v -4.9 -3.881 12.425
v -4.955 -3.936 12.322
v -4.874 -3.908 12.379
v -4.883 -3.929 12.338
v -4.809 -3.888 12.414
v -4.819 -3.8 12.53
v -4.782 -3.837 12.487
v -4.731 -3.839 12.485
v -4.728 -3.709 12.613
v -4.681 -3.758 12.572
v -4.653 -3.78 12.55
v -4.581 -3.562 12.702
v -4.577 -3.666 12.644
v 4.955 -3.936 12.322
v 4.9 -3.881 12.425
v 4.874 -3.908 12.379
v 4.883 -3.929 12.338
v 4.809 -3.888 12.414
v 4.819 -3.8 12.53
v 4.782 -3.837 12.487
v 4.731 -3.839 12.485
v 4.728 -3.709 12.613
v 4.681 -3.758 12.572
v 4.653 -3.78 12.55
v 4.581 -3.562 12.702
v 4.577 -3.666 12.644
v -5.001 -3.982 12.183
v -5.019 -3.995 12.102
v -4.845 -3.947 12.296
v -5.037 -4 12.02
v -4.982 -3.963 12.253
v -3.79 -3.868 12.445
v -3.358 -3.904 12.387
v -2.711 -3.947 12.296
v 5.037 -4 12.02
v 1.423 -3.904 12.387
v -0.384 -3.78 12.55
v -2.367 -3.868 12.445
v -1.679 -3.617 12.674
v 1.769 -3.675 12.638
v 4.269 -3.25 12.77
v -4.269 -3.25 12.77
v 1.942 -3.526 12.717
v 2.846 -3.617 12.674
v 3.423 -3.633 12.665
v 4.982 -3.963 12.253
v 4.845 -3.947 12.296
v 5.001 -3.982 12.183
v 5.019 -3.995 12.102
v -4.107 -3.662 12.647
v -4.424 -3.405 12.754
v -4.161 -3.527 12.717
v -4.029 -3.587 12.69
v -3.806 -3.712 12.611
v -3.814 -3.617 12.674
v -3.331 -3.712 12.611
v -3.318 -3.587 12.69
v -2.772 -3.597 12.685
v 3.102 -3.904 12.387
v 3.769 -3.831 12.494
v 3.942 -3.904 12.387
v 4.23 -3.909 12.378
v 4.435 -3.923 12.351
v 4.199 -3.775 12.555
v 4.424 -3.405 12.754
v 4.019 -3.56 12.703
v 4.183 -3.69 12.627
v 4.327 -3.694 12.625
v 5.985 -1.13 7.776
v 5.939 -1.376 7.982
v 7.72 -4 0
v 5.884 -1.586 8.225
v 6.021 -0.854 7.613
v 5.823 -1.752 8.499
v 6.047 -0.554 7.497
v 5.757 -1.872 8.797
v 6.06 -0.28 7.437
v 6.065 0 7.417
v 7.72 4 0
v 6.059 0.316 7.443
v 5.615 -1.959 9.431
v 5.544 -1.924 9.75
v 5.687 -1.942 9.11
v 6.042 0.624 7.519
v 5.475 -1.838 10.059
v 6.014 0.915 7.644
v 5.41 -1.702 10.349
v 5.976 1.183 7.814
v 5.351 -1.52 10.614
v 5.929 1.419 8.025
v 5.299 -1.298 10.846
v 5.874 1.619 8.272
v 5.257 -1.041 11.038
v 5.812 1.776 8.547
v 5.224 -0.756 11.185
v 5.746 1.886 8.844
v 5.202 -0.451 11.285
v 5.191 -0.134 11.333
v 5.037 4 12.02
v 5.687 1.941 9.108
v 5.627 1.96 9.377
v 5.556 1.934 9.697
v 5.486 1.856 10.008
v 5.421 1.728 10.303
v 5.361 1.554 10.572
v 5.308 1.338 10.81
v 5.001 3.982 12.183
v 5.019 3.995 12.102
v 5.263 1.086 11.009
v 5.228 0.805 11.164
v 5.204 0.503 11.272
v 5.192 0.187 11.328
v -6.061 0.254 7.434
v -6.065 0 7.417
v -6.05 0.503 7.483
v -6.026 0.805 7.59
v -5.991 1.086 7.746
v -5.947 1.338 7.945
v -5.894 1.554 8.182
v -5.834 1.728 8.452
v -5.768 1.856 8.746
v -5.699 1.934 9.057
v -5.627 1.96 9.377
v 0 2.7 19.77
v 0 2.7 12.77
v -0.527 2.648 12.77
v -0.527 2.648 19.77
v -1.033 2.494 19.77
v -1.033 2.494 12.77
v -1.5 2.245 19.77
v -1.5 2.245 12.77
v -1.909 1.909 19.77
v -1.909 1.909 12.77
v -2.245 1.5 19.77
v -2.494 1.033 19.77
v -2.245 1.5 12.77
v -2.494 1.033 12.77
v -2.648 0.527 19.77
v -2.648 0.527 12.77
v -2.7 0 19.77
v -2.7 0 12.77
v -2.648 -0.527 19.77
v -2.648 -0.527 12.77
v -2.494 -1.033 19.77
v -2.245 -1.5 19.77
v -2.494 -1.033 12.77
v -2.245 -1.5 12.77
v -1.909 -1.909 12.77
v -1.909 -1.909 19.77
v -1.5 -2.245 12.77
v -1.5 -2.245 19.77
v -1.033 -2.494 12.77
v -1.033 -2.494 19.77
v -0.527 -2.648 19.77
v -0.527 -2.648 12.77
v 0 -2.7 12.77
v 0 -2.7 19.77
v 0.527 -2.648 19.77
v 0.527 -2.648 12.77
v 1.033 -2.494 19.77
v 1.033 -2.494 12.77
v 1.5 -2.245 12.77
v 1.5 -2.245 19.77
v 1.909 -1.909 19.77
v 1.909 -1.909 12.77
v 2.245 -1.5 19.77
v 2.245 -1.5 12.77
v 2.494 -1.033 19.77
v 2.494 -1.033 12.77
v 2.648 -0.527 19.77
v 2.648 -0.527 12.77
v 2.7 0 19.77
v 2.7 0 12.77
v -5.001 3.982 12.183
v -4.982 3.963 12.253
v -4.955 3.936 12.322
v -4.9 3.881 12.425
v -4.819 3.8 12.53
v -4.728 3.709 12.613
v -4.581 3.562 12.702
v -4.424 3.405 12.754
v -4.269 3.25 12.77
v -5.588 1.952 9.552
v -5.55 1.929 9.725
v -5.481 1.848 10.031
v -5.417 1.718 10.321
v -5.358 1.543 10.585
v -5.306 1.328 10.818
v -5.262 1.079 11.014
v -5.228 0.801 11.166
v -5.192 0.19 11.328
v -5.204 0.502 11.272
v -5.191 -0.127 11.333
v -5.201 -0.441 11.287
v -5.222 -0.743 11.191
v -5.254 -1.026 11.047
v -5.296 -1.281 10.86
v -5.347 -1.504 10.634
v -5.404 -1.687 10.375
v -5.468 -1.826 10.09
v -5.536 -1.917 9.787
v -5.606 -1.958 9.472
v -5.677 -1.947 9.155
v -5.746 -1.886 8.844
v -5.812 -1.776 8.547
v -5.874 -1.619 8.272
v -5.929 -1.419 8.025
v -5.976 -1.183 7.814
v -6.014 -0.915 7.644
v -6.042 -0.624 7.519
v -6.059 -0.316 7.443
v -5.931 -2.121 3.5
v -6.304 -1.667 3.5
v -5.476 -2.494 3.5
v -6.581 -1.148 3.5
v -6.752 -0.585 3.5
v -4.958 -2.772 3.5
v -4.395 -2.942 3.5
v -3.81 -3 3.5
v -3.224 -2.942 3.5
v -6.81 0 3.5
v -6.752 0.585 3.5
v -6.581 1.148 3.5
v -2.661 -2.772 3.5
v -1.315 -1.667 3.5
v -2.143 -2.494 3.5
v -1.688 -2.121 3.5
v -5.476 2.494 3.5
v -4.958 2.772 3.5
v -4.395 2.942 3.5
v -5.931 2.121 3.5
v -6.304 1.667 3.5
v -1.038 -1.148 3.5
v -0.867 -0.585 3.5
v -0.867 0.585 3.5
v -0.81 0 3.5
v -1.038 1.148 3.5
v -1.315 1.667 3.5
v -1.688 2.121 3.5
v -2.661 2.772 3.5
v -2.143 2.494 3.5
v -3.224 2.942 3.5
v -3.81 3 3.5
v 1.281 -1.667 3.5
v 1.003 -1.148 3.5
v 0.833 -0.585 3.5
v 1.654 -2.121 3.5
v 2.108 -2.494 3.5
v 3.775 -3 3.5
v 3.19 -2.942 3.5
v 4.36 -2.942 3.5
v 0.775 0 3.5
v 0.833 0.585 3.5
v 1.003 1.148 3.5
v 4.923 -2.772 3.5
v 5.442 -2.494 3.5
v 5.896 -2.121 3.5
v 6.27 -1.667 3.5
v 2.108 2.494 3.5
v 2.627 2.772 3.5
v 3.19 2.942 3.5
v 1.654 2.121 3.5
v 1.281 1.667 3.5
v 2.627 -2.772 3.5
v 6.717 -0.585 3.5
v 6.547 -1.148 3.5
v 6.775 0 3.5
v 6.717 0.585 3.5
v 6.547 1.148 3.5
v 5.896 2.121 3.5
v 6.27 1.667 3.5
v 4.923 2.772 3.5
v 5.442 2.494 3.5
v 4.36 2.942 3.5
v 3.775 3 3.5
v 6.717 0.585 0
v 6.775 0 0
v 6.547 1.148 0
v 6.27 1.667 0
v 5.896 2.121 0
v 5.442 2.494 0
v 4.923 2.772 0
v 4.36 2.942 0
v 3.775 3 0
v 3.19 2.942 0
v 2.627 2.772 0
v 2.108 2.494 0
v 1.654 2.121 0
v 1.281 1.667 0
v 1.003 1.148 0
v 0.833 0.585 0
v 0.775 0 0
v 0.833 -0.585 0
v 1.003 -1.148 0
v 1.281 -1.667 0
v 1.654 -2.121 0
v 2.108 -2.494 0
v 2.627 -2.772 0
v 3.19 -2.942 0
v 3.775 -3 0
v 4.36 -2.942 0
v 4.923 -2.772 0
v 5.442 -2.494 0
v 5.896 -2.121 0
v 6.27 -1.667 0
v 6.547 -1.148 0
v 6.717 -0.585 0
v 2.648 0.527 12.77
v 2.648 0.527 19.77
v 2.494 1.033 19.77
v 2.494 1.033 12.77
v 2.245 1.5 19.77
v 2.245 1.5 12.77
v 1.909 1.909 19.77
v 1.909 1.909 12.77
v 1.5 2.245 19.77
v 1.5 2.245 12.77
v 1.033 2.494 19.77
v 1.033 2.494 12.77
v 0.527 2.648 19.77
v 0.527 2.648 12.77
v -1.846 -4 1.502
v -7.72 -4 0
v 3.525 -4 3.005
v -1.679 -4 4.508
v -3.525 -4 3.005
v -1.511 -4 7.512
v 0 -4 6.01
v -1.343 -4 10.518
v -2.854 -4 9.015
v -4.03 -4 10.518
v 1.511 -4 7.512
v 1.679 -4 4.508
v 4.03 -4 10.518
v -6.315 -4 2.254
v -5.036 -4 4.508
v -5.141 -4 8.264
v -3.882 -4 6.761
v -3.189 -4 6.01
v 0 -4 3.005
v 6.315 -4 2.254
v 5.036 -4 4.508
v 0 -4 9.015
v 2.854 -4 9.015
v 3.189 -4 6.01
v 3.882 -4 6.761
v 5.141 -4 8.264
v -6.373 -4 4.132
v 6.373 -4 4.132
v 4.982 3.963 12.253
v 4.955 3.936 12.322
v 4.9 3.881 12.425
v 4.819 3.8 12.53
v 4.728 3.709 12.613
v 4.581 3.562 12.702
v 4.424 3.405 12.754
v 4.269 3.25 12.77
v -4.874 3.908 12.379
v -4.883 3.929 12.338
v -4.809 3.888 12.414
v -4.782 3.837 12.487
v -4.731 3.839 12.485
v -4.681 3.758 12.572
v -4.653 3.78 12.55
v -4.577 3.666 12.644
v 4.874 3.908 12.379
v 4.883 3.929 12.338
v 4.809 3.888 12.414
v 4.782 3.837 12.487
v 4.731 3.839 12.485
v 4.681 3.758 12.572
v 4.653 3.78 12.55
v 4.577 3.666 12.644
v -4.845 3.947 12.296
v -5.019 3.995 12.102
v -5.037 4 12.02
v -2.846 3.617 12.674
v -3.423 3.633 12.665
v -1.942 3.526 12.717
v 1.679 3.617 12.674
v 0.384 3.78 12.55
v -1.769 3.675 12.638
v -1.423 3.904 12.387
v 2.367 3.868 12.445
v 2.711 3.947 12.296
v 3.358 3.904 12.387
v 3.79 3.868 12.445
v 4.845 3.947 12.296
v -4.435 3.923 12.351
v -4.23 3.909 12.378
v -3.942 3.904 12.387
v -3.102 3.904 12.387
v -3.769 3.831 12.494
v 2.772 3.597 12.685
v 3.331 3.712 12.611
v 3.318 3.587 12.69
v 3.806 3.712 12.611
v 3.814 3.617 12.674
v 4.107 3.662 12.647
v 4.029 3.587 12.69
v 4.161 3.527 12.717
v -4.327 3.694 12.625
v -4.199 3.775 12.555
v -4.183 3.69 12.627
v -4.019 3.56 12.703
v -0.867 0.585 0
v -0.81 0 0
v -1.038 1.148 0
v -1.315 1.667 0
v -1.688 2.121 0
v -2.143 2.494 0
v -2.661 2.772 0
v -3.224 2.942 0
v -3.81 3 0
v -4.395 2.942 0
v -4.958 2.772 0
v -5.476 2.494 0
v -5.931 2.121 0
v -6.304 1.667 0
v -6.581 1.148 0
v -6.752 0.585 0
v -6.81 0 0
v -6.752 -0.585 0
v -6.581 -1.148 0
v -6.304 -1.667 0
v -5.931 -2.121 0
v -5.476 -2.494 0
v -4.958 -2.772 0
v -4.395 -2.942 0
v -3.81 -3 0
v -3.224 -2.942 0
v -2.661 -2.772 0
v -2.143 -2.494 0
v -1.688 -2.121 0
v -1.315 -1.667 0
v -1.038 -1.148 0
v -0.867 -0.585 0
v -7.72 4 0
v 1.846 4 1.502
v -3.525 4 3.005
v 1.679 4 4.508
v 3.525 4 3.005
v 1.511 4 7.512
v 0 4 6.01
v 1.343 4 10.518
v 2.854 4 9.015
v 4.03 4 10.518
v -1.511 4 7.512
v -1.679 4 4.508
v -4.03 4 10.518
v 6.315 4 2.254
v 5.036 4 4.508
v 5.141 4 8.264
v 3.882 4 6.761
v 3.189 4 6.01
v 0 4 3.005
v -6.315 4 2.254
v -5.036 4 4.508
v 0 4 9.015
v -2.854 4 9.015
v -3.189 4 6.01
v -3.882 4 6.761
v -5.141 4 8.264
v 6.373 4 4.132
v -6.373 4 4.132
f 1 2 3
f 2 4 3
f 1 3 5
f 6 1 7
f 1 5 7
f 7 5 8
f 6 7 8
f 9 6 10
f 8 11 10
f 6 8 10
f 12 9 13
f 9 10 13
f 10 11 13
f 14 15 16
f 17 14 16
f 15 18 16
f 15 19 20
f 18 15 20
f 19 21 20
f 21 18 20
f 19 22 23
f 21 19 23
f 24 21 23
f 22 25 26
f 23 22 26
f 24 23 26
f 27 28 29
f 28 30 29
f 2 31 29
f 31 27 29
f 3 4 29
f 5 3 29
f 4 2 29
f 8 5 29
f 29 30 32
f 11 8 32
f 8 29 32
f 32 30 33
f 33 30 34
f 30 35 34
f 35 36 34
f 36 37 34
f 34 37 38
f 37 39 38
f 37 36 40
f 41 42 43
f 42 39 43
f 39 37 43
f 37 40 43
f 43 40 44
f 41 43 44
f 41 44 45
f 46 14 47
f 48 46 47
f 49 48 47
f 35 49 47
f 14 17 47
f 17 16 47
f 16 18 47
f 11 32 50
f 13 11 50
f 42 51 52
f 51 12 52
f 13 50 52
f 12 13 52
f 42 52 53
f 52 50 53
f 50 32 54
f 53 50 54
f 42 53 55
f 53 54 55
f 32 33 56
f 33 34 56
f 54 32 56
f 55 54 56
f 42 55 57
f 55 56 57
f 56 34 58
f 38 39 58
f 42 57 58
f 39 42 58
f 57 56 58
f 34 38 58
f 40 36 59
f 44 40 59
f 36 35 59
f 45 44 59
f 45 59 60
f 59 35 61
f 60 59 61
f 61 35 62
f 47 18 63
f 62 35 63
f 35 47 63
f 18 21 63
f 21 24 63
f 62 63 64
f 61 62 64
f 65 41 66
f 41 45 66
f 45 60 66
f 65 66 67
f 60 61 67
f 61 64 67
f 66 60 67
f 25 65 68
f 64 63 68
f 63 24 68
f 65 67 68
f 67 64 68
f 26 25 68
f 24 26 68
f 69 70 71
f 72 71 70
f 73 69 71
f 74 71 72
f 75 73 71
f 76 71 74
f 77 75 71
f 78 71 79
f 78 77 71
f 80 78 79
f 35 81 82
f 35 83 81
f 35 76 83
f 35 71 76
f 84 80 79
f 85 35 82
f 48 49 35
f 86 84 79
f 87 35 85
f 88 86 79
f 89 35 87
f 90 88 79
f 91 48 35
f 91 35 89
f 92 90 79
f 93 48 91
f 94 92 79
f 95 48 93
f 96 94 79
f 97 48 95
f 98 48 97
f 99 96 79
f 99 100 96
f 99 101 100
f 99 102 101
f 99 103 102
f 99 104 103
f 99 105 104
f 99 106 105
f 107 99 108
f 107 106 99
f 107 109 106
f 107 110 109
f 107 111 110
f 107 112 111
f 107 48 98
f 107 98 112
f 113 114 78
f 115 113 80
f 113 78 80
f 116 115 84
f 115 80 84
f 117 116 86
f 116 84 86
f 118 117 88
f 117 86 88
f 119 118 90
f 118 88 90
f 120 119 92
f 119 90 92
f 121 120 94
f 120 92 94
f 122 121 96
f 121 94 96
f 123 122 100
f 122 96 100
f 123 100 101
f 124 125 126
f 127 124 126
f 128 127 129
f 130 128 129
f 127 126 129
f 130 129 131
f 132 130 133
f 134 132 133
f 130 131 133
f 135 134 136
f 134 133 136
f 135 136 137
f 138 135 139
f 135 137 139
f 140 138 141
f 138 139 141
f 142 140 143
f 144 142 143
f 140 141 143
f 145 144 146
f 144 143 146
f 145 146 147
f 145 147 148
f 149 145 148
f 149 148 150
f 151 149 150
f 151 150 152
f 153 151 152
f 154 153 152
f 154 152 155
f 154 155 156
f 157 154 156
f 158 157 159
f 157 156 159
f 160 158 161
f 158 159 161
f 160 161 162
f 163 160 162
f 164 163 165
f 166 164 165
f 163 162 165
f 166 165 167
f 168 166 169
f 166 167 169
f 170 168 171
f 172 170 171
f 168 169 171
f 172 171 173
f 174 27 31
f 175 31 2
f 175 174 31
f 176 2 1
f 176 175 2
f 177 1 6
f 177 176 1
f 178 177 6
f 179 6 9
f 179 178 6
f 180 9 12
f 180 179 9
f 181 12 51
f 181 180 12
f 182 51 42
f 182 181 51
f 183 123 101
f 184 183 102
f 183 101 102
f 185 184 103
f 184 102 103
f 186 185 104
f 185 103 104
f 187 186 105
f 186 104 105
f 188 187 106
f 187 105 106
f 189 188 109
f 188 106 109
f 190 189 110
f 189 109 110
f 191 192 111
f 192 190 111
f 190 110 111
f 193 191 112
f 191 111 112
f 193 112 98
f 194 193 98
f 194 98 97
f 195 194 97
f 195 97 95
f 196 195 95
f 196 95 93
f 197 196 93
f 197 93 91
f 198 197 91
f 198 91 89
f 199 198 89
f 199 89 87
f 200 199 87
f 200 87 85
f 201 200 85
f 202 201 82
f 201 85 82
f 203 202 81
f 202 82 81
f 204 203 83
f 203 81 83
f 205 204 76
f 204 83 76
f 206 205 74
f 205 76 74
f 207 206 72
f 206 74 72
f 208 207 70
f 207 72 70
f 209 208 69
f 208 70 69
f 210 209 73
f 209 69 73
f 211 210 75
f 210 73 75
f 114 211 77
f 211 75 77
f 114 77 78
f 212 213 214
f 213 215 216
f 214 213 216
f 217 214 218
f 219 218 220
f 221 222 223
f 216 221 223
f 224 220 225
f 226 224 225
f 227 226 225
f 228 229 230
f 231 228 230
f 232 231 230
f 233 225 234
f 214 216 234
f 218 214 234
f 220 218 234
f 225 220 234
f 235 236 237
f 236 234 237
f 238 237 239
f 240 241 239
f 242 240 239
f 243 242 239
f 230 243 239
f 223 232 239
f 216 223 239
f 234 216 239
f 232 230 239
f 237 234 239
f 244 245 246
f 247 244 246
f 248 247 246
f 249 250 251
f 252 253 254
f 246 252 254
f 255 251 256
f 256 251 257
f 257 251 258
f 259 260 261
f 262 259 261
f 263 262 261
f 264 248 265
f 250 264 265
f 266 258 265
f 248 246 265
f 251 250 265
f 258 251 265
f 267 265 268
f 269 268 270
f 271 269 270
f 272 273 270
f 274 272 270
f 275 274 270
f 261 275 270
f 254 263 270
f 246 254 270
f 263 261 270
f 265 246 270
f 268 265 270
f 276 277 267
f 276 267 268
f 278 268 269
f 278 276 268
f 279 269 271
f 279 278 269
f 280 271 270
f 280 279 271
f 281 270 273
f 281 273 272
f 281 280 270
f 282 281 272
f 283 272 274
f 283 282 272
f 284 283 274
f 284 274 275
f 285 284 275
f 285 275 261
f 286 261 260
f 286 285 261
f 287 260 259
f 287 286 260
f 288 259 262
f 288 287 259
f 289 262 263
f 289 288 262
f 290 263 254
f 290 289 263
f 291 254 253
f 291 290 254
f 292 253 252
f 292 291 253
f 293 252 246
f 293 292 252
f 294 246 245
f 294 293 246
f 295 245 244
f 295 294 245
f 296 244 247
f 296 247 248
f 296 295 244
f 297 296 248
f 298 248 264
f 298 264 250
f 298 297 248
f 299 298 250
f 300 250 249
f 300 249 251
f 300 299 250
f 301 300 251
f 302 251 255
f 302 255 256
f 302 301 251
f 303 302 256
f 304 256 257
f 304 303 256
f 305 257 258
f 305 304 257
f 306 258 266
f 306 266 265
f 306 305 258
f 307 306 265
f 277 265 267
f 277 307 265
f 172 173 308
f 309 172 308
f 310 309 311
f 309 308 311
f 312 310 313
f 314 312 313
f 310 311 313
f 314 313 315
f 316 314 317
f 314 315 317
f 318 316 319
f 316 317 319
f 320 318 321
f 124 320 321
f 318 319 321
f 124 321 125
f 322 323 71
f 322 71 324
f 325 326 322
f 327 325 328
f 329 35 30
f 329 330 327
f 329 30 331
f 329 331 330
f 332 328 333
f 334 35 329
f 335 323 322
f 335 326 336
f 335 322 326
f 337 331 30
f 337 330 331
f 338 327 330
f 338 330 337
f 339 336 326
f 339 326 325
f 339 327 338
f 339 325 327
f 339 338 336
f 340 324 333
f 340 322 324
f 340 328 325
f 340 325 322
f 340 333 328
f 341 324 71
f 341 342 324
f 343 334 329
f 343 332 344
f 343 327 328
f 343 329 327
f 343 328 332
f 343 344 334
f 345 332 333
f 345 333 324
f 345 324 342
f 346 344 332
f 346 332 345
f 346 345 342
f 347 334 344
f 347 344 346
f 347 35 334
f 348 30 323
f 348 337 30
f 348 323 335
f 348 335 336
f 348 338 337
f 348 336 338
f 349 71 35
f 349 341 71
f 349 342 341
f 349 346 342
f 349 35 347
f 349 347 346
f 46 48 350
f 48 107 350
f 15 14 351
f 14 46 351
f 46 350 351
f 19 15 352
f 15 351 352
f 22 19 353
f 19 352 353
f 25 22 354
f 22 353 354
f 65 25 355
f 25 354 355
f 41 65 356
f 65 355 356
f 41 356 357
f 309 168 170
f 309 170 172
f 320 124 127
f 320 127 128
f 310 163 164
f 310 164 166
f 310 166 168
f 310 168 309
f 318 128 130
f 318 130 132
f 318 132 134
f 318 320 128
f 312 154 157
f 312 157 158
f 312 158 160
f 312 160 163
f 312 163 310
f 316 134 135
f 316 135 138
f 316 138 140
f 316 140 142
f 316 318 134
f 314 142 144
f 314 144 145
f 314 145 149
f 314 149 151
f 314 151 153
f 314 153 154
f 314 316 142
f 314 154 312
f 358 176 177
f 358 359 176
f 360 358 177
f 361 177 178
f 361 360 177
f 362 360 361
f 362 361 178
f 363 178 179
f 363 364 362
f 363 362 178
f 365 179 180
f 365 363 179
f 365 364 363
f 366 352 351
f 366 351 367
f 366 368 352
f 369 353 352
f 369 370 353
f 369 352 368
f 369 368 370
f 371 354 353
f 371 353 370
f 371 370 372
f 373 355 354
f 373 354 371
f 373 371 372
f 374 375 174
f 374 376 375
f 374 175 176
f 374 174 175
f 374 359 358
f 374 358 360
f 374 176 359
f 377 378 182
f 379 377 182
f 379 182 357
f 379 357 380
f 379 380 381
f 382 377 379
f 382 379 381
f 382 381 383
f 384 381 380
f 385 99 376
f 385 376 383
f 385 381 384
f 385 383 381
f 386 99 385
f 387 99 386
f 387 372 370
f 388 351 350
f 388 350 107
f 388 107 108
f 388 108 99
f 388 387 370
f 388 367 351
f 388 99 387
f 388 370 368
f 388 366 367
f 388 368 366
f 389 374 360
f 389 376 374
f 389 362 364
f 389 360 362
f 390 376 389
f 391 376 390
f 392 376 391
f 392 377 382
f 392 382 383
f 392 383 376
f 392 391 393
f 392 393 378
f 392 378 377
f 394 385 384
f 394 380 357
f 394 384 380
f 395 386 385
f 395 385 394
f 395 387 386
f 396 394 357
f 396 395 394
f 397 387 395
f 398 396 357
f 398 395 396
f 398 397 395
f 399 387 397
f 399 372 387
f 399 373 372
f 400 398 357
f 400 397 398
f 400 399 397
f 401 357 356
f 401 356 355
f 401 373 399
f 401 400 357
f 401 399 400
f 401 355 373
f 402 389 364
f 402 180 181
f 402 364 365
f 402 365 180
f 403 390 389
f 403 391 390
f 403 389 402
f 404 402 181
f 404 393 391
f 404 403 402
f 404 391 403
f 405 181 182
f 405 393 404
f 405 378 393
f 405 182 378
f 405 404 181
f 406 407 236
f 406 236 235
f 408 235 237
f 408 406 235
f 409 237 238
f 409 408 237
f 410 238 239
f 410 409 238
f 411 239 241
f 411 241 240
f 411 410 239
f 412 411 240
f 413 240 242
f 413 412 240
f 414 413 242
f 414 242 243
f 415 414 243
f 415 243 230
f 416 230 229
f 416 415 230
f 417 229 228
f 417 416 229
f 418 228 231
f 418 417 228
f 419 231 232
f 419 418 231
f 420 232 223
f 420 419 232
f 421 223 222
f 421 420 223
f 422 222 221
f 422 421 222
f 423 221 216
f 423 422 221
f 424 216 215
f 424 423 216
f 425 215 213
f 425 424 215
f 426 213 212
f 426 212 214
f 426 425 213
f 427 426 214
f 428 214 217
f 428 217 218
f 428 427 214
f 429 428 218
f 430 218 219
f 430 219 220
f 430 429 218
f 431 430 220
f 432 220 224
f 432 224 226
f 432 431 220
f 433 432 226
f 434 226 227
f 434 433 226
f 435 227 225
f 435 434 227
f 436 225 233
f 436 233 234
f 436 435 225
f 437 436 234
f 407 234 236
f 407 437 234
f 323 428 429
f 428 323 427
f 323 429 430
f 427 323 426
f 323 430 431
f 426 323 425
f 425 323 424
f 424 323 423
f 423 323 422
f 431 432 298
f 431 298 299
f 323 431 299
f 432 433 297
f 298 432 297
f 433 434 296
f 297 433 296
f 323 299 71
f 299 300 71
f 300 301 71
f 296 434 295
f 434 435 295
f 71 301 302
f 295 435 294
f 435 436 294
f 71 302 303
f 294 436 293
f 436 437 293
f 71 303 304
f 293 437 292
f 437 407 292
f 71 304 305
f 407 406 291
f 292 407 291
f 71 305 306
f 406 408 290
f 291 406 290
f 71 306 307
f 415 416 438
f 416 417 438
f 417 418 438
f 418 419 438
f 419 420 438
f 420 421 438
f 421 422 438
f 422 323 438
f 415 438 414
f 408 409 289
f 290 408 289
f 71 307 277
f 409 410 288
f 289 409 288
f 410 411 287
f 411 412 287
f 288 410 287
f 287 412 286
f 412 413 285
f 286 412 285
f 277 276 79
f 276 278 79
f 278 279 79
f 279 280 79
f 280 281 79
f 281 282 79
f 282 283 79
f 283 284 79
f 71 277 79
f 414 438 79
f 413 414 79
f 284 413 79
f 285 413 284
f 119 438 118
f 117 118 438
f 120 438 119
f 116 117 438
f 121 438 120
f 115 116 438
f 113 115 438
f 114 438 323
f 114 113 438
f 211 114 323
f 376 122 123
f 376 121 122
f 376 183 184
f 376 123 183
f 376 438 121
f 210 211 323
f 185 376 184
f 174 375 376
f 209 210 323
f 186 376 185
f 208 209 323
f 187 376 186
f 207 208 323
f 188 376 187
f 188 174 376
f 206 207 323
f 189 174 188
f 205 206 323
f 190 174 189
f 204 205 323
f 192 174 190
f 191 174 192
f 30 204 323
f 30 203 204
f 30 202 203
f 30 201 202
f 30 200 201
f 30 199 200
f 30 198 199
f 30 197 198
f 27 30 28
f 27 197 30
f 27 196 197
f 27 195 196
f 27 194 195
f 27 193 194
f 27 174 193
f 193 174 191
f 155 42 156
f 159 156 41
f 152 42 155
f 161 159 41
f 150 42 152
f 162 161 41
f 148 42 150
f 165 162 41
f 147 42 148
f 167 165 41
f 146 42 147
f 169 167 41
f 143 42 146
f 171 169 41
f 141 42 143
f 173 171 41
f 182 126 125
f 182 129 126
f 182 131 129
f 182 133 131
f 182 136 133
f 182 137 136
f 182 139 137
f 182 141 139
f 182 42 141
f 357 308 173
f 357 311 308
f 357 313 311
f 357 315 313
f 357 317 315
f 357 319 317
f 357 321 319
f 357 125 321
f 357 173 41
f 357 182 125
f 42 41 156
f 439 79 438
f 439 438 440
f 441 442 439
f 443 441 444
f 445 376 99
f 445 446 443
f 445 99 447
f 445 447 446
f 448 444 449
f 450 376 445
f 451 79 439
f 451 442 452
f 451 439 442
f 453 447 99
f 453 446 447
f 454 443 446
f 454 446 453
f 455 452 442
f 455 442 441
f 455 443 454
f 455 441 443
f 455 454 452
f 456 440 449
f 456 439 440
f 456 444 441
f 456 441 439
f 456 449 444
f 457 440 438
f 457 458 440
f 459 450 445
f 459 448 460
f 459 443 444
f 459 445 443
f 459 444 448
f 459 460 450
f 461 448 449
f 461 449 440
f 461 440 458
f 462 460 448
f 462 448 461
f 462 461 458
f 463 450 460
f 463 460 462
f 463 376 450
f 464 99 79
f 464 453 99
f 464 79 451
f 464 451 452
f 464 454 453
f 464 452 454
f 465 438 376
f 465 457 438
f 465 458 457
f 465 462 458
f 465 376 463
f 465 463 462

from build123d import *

# Parameters (mm, degrees)
F0_W      = 15.44
F0_H      = 8
F2_W      = 9.74
F2_H      = 8
F4_R      = 0.75
F7_DEPTH  = 100
F8_R      = 3
F9_DEPTH  = 3.5
F11_DEPTH = 7


with BuildPart() as f3:
    # F0 (on Top) → F3 section 0
    with BuildSketch(Plane.XY):
        Rectangle(F0_W, F0_H)
    # F2 (on offset) → F3 section 1
    with BuildSketch(Plane.XY.offset(12.77)):
        Rectangle(F2_W, F2_H)
    loft()

    # F4
    f4_edges = [f3.edges().sort_by_distance(p)[0] for p in [
        (4.87, 0, 12.77),
        (0, -4, 12.77),
        (-4.87, 0, 12.77),
        (0, 4, 12.77),
    ]]
    fillet(f4_edges, radius=F4_R)

    # F6 (on offset) → F7 (cut)
    with BuildSketch(Plane.YZ.offset(25)):
        with BuildLine():
            ThreePointArc((0, 7.4171952983), (1.3859292911, 7.9912660072), (1.96, 9.3771952983))
            ThreePointArc((1.96, 9.3771952983), (-1.3859292911, 10.7631245894), (0, 7.4171952983))
        make_face()
    extrude(amount=-F7_DEPTH, mode=Mode.SUBTRACT)

    # F8 (on Top) → F9 (cut)
    with BuildSketch(Plane.XY):
        with Locations((-3.8095137819, 0)):
            Circle(F8_R)
        with Locations((3.7751071386, 0)):
            Circle(F8_R)
    extrude(amount=F9_DEPTH, mode=Mode.SUBTRACT)

    # F10 (on offset) → F11 (join)
    with BuildSketch(Plane.XY.offset(12.77)):
        with BuildLine():
            ThreePointArc((0, 2.7), (-1.9091883092, -1.9091883092), (2.7, 0))
            ThreePointArc((2.7, 0), (1.9091883092, 1.9091883092), (0, 2.7))
        make_face()
    extrude(amount=F11_DEPTH)


solid = f3.part
